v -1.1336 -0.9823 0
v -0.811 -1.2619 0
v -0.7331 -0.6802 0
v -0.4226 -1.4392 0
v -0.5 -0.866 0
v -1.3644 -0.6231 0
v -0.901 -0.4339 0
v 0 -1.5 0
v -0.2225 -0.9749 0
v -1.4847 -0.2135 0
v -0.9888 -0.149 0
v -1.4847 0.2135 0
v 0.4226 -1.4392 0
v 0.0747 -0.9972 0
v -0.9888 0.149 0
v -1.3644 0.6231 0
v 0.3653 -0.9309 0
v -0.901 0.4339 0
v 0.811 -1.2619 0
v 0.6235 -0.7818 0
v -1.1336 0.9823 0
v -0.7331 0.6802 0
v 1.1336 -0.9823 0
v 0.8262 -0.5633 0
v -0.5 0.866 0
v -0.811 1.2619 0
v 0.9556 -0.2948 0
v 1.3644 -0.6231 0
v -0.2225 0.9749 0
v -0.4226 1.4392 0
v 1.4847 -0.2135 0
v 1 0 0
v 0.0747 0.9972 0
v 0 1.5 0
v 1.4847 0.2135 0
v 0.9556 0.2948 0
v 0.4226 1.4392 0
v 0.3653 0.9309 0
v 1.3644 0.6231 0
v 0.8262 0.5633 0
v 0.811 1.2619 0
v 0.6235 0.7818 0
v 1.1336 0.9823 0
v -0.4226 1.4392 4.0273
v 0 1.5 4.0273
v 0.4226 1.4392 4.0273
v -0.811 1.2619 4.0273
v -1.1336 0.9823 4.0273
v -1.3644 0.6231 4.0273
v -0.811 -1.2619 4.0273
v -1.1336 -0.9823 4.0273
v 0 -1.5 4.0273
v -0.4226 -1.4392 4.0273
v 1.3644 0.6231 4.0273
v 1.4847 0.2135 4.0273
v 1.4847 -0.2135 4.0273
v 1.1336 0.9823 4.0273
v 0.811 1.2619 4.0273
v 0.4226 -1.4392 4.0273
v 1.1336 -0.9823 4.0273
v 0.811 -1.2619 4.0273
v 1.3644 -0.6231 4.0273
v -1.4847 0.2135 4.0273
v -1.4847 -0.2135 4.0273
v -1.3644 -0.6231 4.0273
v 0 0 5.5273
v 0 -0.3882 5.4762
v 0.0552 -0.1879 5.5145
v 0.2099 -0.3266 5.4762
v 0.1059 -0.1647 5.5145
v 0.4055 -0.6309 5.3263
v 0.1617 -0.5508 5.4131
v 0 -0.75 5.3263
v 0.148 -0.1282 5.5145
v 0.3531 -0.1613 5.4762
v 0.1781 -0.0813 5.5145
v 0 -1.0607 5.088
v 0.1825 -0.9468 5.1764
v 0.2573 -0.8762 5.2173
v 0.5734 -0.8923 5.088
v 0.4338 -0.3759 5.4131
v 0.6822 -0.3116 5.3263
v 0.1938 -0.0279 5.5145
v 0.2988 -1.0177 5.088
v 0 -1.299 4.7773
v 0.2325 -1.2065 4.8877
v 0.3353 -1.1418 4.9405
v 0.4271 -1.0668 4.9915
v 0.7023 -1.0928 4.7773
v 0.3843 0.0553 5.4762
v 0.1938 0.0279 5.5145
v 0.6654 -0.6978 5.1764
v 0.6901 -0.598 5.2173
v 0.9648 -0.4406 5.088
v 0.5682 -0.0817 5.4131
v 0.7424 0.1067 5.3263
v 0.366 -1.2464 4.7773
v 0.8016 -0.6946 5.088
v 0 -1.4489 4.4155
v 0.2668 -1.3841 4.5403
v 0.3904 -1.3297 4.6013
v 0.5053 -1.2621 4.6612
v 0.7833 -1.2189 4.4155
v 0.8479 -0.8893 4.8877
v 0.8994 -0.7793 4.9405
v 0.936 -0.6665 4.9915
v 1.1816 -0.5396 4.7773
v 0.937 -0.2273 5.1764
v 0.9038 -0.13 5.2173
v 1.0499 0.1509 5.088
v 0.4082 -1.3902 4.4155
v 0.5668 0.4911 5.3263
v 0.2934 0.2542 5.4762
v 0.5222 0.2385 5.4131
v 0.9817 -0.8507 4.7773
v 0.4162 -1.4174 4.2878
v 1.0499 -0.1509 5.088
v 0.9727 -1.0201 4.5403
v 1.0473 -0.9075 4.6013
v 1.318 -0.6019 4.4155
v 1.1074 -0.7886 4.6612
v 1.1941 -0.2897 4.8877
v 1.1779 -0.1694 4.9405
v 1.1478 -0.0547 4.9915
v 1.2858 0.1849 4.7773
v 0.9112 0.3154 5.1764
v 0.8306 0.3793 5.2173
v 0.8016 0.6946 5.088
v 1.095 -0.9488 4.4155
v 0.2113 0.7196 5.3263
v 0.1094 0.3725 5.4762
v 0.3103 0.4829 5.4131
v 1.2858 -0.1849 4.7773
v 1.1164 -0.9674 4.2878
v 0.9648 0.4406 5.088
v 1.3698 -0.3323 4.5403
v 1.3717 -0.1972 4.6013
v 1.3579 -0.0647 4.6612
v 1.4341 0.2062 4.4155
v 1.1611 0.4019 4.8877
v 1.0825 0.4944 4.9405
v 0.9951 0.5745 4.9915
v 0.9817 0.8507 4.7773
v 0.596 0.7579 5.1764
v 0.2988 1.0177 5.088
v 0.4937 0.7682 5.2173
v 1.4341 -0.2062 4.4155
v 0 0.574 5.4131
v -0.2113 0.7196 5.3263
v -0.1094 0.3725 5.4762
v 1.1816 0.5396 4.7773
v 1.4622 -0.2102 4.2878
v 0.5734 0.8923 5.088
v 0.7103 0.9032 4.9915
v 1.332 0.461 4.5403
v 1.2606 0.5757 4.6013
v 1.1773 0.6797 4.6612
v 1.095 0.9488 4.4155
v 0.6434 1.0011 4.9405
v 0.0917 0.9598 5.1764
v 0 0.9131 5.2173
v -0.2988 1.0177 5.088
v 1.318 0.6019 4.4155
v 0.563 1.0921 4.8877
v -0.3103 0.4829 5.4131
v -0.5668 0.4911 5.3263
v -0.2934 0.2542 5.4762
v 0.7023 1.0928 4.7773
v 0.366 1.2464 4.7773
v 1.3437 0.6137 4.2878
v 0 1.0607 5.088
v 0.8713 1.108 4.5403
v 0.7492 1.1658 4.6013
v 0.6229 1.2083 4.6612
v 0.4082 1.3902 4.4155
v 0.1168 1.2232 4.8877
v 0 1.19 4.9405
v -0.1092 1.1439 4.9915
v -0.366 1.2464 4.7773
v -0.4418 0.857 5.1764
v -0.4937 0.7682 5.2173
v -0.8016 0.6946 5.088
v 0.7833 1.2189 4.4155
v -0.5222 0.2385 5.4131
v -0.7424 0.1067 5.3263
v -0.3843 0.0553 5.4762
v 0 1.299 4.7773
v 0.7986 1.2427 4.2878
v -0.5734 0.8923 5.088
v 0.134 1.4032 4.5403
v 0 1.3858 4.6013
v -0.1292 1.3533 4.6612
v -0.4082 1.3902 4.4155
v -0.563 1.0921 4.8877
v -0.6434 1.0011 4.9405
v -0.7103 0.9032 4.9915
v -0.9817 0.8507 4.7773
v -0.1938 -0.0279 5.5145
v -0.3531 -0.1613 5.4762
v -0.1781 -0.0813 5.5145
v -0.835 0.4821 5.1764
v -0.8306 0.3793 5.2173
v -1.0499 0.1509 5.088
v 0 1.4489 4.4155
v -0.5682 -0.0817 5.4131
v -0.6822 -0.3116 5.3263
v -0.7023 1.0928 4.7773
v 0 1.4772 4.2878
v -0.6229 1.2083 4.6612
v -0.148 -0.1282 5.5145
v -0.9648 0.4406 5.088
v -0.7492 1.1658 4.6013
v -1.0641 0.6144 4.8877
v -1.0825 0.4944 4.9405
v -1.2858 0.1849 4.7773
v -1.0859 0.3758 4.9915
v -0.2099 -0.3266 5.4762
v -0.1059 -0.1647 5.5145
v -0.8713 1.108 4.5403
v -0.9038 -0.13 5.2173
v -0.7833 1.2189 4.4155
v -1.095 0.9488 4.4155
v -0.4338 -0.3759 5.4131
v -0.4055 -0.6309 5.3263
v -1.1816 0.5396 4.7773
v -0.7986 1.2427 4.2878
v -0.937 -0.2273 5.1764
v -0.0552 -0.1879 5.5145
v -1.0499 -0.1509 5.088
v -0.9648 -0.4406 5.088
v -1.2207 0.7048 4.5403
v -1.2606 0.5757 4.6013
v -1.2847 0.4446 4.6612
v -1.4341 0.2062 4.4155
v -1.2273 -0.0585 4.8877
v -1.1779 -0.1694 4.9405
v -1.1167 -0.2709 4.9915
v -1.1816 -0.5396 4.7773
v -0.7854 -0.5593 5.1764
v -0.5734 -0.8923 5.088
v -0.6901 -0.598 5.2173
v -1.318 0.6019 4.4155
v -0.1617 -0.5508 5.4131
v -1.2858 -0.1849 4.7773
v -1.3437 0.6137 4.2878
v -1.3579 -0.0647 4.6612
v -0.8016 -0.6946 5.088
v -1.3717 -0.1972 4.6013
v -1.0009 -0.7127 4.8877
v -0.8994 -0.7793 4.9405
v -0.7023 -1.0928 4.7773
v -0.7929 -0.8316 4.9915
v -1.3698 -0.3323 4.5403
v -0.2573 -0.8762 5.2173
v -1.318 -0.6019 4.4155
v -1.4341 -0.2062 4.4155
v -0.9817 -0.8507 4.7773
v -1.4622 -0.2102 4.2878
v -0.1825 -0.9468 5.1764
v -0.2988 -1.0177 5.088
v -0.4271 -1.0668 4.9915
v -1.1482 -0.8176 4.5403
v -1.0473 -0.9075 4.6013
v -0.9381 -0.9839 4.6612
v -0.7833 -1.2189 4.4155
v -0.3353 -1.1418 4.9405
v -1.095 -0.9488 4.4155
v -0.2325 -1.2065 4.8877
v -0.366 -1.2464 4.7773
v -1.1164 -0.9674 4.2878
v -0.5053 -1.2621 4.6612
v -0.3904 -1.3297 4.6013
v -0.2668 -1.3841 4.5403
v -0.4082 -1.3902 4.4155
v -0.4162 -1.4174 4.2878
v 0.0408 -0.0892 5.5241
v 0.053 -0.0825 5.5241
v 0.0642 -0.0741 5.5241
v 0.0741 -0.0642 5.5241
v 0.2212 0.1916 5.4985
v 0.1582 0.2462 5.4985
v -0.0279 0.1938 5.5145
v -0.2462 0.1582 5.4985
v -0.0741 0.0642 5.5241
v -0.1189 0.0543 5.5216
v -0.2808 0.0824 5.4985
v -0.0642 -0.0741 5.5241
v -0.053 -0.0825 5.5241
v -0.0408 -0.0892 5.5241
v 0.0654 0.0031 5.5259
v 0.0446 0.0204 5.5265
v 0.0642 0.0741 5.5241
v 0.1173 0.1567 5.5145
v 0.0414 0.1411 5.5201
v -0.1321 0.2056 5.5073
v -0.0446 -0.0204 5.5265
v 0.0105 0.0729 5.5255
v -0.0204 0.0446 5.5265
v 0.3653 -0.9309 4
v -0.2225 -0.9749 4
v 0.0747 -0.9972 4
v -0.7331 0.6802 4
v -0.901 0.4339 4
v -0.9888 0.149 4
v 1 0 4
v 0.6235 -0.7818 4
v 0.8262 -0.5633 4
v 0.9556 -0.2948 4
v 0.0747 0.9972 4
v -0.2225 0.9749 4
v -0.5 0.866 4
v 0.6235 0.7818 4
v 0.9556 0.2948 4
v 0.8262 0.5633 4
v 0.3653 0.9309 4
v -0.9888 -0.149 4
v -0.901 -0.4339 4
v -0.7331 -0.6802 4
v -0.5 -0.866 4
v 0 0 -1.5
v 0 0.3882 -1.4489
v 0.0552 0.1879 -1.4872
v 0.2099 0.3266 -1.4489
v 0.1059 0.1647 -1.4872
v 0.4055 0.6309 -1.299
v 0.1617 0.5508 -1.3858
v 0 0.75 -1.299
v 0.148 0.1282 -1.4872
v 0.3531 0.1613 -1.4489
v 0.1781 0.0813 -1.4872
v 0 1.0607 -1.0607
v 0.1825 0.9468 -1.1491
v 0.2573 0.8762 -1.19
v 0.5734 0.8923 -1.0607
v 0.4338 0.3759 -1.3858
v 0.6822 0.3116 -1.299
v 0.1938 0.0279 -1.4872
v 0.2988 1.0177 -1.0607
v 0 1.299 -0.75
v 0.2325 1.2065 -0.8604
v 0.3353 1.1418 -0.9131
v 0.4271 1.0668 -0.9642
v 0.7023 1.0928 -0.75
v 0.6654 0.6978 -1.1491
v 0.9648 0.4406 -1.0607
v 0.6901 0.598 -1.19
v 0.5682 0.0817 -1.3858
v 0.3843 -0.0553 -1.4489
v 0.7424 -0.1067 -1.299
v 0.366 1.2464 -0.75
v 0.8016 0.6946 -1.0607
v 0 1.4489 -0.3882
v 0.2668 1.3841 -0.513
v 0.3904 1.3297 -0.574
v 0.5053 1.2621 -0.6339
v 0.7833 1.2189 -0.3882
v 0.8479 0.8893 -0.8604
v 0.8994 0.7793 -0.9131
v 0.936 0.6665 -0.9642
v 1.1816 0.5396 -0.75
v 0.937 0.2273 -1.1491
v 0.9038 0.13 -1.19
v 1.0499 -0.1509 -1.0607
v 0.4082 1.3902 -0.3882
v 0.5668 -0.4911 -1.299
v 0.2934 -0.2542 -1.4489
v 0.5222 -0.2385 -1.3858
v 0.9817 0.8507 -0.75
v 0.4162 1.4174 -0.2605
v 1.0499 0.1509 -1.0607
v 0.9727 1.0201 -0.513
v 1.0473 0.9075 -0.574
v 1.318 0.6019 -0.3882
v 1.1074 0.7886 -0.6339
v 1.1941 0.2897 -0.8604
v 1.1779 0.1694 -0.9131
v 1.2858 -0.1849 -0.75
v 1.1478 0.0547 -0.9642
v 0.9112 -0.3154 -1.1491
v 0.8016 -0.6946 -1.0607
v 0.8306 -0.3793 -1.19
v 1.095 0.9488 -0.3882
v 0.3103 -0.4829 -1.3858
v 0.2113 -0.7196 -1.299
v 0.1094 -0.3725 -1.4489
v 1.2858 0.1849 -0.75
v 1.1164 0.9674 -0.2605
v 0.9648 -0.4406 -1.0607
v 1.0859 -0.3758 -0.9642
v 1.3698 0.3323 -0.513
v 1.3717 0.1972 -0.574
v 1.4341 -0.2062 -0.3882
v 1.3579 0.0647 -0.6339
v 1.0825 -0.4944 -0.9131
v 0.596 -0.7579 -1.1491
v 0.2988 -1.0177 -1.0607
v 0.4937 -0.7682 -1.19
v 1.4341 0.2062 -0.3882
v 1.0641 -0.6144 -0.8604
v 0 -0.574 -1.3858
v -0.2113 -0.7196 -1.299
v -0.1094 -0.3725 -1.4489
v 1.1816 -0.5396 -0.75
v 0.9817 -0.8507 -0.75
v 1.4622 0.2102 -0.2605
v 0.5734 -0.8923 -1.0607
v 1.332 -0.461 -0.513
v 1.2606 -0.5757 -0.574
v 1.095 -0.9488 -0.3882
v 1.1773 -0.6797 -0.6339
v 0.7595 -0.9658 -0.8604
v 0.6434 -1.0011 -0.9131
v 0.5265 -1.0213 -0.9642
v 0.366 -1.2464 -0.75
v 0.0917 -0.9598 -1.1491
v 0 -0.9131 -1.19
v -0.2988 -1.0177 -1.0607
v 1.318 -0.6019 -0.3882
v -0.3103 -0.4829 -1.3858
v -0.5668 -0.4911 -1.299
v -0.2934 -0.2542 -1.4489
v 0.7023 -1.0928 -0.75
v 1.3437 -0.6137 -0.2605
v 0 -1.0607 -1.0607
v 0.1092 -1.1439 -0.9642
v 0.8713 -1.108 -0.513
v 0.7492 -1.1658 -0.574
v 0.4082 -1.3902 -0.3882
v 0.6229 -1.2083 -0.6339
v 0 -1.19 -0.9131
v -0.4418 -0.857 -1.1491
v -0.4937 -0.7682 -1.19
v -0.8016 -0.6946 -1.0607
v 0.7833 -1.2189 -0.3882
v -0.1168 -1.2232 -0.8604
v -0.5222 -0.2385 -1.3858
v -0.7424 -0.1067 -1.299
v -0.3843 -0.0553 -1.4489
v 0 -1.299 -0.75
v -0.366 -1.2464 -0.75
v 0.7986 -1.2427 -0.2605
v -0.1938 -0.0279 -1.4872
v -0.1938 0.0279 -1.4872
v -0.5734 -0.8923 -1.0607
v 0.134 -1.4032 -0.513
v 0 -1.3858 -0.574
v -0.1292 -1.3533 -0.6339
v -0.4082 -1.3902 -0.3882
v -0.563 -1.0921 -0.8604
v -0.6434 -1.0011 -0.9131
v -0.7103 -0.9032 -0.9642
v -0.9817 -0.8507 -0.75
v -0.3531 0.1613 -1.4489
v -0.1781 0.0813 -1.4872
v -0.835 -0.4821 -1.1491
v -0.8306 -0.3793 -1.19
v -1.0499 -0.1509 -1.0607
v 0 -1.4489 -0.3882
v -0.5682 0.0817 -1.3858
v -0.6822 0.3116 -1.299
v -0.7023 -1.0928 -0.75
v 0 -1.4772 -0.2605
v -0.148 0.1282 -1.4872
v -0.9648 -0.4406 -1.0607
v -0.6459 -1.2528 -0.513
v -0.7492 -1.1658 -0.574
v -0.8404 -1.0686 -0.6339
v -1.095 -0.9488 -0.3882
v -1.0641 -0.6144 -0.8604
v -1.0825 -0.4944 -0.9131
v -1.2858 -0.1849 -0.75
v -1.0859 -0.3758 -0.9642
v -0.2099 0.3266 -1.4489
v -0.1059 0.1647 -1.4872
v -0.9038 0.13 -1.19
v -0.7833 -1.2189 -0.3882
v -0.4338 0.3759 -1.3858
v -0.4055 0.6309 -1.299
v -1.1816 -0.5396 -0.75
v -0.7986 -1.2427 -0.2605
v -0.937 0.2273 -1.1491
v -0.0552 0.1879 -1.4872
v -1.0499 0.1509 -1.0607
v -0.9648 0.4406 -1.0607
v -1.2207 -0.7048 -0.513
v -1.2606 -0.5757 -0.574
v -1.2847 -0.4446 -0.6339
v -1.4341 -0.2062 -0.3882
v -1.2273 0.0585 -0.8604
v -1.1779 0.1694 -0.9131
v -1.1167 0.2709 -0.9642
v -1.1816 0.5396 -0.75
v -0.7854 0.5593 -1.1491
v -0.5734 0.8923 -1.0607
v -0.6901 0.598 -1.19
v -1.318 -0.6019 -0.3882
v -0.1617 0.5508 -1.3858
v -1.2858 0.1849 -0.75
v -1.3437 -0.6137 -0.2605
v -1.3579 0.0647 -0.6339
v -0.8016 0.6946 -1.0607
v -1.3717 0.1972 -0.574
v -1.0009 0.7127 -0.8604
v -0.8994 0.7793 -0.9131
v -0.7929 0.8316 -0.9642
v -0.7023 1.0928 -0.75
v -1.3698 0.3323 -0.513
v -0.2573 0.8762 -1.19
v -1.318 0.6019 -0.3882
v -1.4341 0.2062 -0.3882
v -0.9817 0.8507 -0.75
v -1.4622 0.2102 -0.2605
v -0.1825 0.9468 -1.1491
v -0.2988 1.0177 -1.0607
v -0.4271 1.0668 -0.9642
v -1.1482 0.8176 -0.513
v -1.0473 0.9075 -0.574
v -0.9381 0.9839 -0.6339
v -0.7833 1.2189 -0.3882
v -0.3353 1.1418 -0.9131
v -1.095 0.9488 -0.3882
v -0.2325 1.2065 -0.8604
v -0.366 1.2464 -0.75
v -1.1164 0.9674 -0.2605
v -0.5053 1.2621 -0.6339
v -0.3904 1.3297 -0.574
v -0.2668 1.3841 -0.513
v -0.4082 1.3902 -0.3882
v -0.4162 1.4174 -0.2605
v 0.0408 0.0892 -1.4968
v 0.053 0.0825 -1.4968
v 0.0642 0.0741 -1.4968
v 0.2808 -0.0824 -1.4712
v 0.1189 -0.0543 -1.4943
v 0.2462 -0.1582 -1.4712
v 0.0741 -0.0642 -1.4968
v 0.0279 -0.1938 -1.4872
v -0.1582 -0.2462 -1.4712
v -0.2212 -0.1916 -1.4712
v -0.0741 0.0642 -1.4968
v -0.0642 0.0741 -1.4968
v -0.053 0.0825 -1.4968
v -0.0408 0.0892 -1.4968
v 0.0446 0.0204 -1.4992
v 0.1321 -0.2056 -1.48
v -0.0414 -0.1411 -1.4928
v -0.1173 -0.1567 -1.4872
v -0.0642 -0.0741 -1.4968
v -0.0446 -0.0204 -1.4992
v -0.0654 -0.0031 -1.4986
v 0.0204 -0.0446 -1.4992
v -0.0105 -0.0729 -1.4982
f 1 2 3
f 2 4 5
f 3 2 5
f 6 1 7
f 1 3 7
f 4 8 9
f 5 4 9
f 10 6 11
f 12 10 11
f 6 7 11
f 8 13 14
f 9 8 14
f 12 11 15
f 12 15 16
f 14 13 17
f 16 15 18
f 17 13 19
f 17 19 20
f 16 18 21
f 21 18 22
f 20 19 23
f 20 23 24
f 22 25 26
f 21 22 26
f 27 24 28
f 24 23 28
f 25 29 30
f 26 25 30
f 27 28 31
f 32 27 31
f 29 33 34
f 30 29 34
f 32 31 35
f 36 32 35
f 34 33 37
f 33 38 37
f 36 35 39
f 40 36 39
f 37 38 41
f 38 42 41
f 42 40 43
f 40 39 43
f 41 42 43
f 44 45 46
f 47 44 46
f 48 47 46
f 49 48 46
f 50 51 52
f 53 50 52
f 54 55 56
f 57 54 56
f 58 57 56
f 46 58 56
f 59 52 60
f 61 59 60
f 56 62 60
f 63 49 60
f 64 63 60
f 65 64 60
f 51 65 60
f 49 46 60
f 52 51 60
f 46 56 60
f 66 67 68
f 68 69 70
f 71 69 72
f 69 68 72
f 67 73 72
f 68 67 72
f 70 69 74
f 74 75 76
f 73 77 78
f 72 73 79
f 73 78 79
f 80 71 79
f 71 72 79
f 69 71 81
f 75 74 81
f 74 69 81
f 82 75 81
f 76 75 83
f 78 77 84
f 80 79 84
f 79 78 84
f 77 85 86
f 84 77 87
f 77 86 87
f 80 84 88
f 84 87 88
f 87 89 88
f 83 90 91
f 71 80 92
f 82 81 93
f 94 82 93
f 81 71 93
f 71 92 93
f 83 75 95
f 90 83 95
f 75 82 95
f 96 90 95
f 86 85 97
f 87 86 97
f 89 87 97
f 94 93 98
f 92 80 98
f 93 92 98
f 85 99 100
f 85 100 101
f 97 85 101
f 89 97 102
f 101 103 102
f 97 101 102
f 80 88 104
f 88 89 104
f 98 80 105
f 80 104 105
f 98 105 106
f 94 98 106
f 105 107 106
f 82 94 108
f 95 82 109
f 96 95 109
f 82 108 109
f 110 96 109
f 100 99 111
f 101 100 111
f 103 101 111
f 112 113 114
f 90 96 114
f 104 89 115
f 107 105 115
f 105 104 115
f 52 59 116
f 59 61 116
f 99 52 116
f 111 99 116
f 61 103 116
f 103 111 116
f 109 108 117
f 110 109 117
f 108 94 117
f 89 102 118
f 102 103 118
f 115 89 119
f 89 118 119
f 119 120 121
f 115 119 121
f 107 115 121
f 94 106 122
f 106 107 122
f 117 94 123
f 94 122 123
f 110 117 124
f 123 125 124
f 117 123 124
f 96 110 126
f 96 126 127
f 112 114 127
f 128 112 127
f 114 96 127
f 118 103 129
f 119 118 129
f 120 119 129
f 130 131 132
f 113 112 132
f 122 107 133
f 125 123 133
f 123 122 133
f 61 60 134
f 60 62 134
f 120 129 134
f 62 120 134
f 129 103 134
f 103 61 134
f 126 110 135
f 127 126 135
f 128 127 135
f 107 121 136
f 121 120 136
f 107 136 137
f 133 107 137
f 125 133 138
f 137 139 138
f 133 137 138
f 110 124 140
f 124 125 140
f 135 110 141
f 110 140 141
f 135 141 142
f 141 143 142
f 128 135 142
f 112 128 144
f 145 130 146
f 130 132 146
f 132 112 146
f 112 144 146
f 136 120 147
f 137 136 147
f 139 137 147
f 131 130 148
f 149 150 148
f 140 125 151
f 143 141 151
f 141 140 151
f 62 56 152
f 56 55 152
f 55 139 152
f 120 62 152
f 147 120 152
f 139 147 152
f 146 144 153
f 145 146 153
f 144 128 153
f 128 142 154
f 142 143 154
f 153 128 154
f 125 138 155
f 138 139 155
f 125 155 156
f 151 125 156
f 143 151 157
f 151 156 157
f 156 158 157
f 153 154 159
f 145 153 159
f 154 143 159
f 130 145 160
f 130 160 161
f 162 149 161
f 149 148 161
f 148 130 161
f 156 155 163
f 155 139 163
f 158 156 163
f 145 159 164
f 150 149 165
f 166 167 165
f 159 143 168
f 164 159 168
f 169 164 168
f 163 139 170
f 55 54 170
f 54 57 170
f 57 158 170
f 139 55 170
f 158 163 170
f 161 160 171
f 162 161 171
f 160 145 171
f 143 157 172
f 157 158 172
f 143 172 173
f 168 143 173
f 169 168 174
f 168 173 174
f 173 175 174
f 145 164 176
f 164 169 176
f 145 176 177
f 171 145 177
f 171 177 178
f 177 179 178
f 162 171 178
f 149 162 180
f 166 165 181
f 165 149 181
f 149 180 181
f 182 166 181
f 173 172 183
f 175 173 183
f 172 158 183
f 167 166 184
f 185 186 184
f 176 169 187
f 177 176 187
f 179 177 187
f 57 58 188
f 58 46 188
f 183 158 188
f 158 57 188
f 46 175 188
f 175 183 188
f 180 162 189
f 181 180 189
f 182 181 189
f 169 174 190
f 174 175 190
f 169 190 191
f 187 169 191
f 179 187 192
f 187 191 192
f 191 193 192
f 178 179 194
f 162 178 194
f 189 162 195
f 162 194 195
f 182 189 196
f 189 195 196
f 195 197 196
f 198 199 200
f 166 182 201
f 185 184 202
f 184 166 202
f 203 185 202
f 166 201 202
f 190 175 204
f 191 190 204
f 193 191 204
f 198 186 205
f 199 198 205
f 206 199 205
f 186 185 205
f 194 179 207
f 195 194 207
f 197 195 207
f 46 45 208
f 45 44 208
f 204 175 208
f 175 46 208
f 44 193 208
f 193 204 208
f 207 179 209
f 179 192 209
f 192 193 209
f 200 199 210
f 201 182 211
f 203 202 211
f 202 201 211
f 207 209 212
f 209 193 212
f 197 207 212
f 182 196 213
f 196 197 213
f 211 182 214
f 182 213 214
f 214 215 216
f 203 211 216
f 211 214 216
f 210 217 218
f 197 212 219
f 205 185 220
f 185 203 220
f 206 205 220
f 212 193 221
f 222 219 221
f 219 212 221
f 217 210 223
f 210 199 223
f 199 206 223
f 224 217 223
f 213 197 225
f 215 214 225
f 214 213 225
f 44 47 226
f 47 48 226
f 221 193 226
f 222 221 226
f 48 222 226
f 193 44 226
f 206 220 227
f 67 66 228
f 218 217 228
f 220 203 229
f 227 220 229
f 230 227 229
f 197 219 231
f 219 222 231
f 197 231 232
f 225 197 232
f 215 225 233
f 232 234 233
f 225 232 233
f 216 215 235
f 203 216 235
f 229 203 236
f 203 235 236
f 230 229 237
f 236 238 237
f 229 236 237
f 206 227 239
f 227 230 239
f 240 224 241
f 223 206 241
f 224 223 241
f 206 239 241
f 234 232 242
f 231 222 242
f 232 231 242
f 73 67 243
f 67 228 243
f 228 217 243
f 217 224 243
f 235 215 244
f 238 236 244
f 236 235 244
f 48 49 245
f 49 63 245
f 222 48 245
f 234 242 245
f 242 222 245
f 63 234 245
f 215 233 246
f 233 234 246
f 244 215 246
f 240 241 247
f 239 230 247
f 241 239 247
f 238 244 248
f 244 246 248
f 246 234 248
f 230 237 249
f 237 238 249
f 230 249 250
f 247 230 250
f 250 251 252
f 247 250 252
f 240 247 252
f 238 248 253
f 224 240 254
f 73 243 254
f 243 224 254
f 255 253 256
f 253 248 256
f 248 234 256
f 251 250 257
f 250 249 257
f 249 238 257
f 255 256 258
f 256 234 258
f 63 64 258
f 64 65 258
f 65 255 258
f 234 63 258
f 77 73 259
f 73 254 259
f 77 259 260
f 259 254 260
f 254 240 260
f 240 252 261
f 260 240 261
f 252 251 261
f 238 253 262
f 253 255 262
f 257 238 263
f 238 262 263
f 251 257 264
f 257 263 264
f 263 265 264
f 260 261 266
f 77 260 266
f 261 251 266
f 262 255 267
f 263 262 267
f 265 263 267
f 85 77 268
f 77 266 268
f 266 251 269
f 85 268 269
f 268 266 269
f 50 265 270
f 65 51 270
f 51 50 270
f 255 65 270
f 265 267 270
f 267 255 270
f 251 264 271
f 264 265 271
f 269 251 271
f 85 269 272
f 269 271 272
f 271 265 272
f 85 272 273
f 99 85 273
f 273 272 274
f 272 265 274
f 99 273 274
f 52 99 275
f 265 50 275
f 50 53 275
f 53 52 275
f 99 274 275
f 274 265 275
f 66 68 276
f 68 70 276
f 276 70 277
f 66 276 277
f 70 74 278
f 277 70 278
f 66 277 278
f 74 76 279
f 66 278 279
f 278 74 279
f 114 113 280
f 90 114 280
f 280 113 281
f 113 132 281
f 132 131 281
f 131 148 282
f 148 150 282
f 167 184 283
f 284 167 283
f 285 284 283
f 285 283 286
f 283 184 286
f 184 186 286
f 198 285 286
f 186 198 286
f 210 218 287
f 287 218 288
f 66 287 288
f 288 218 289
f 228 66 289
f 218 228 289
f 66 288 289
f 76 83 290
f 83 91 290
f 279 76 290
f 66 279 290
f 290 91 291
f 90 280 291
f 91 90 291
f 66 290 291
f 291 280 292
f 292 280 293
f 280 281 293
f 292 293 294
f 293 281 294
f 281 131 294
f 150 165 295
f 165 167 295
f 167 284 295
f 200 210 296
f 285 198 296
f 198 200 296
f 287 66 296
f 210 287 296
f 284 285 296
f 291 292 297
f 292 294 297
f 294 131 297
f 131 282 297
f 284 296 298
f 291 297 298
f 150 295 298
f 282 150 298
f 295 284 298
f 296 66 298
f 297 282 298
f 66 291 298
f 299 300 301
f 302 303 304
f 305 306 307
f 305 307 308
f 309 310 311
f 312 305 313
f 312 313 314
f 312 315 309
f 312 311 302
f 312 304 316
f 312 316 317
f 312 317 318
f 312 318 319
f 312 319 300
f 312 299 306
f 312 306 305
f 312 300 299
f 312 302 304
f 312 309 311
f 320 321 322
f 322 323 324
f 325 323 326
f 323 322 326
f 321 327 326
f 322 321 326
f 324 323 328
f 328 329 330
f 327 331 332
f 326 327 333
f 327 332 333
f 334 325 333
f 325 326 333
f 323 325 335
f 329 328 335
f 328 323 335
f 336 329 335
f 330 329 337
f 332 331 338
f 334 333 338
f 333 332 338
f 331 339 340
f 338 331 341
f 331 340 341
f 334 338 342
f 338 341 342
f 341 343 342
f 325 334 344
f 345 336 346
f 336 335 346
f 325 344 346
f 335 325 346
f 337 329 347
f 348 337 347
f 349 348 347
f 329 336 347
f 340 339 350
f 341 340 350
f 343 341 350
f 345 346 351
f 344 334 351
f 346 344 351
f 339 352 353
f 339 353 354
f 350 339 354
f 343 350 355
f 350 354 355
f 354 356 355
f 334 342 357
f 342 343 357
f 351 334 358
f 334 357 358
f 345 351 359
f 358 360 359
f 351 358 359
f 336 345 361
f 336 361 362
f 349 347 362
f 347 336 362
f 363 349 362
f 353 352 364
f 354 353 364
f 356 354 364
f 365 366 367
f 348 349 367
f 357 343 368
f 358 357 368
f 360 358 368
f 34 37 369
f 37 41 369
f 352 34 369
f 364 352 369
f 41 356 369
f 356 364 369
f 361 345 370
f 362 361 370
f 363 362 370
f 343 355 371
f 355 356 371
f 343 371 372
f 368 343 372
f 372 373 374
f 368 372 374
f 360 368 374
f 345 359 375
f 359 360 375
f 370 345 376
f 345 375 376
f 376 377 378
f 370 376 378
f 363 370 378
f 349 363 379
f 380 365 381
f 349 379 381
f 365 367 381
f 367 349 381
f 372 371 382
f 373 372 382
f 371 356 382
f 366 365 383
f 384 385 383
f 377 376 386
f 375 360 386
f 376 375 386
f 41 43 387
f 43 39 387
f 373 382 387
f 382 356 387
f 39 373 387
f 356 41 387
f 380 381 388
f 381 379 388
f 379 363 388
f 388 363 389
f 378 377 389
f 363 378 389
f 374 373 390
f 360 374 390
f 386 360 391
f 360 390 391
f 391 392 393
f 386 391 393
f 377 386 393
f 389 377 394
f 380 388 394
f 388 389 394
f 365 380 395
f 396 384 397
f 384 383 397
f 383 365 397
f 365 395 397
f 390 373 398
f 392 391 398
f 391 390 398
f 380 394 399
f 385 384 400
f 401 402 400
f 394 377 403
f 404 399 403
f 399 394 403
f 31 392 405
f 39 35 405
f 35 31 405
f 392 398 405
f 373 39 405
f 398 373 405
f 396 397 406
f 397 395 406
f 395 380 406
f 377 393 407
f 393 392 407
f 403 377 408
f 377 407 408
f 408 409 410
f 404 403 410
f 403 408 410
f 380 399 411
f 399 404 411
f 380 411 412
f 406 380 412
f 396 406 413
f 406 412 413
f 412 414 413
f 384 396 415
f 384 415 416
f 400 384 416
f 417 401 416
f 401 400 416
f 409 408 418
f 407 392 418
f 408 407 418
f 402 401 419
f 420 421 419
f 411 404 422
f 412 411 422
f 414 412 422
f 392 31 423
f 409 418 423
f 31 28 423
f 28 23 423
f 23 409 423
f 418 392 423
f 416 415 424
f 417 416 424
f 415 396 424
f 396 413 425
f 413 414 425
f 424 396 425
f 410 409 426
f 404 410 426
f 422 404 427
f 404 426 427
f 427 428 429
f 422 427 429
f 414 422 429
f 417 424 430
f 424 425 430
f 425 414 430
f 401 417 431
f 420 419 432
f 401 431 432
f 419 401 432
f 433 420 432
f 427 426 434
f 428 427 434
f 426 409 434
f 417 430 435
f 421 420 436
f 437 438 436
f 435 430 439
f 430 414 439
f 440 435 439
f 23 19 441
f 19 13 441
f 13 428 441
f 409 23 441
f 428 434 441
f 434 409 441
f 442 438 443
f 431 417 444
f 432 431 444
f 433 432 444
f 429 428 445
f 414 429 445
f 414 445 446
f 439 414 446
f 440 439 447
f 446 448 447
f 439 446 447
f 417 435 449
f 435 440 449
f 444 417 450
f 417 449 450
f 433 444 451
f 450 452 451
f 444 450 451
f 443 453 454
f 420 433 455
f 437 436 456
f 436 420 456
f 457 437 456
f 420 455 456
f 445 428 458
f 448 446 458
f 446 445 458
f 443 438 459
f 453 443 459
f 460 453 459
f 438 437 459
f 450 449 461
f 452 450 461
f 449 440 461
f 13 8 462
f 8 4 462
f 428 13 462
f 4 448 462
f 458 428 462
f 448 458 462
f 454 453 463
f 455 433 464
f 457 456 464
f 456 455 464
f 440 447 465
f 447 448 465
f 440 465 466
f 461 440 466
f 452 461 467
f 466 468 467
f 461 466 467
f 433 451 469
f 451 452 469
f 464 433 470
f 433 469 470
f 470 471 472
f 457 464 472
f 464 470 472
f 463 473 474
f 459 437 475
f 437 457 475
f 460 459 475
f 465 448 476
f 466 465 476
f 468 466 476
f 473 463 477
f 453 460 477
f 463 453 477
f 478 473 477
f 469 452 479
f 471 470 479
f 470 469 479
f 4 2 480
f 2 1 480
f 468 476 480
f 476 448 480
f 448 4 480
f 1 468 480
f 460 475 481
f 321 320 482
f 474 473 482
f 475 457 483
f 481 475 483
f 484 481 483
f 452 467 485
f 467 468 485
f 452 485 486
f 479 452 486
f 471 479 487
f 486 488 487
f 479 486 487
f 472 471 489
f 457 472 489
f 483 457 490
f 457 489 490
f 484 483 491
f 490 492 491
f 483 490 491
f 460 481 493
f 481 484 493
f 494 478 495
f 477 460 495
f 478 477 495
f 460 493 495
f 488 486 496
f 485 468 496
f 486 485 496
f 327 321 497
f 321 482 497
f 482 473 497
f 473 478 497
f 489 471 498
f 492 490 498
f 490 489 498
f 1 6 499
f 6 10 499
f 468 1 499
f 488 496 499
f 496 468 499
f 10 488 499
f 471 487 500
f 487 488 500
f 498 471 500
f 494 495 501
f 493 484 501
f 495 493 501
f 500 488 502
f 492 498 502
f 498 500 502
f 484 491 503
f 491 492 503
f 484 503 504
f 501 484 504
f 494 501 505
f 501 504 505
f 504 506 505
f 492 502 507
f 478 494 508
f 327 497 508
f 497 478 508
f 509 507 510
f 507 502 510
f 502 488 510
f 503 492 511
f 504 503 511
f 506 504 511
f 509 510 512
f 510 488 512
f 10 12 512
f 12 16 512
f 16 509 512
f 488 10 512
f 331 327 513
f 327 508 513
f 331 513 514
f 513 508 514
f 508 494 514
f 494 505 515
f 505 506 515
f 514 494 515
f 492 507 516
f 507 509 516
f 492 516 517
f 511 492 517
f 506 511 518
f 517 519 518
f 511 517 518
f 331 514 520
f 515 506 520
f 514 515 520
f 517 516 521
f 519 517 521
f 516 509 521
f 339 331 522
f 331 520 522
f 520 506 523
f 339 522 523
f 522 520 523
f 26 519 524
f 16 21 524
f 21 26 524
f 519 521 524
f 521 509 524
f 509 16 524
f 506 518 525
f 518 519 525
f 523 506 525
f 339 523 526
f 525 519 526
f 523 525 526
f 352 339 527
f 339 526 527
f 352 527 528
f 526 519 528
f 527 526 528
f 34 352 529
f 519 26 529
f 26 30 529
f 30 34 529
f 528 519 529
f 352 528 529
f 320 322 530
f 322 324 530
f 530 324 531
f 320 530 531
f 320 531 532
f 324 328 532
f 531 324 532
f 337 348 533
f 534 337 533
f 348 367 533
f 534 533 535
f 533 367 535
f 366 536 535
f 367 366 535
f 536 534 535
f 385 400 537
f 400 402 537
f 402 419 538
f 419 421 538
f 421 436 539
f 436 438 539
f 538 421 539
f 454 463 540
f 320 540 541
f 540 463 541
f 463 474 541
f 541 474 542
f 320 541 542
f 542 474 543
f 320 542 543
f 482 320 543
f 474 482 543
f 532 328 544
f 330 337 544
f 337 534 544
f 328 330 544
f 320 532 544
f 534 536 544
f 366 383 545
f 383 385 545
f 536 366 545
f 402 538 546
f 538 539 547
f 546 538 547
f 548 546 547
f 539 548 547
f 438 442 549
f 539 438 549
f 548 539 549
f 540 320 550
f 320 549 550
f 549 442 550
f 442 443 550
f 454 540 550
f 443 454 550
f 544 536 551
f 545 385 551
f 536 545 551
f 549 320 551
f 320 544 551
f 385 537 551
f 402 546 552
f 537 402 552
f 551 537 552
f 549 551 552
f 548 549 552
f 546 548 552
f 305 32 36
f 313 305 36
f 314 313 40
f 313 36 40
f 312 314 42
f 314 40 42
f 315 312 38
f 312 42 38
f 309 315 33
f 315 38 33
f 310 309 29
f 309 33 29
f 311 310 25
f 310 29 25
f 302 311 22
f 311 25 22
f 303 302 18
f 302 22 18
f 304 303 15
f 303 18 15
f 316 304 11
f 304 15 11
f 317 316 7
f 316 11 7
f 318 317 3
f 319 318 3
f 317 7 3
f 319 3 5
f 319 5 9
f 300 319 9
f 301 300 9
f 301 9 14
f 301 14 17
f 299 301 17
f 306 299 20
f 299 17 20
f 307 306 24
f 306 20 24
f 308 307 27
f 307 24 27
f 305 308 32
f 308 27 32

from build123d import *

# Parameters (mm, degrees)
F0_R     = 1
F1_DEPTH = 4


with BuildPart() as f1:
    # F0 (on Top) → F1 (new body)
    with BuildSketch(Plane.XY):
        Circle(F0_R)
    extrude(amount=F1_DEPTH)

    # F2 (on Right) → F3 (revolve)
    with BuildSketch(Plane.YZ):
        with BuildLine():
            Line((0, 0), (0, -1.5))
            ThreePointArc((0, -1.5), (1.06066, -1.06066), (1.5, 0))
            Line((1.5, 0), (0, 0))
        make_face()
    revolve(axis=Axis((0, 0, -0.75), (0, 0, -1)))


with BuildPart() as f5:
    # F4 (on Right) → F5 (revolve)
    with BuildSketch(Plane.YZ):
        with BuildLine():
            Line((0, 4.02731), (0, 5.52731))
            ThreePointArc((0, 5.52731), (-1.06066, 5.08797), (-1.5, 4.02731))
            Line((-1.5, 4.02731), (0, 4.02731))
        make_face()
    revolve(axis=Axis((0, 0, 4.77731), (0, 0, 1)))


solid = Compound([f1.part, f5.part])
